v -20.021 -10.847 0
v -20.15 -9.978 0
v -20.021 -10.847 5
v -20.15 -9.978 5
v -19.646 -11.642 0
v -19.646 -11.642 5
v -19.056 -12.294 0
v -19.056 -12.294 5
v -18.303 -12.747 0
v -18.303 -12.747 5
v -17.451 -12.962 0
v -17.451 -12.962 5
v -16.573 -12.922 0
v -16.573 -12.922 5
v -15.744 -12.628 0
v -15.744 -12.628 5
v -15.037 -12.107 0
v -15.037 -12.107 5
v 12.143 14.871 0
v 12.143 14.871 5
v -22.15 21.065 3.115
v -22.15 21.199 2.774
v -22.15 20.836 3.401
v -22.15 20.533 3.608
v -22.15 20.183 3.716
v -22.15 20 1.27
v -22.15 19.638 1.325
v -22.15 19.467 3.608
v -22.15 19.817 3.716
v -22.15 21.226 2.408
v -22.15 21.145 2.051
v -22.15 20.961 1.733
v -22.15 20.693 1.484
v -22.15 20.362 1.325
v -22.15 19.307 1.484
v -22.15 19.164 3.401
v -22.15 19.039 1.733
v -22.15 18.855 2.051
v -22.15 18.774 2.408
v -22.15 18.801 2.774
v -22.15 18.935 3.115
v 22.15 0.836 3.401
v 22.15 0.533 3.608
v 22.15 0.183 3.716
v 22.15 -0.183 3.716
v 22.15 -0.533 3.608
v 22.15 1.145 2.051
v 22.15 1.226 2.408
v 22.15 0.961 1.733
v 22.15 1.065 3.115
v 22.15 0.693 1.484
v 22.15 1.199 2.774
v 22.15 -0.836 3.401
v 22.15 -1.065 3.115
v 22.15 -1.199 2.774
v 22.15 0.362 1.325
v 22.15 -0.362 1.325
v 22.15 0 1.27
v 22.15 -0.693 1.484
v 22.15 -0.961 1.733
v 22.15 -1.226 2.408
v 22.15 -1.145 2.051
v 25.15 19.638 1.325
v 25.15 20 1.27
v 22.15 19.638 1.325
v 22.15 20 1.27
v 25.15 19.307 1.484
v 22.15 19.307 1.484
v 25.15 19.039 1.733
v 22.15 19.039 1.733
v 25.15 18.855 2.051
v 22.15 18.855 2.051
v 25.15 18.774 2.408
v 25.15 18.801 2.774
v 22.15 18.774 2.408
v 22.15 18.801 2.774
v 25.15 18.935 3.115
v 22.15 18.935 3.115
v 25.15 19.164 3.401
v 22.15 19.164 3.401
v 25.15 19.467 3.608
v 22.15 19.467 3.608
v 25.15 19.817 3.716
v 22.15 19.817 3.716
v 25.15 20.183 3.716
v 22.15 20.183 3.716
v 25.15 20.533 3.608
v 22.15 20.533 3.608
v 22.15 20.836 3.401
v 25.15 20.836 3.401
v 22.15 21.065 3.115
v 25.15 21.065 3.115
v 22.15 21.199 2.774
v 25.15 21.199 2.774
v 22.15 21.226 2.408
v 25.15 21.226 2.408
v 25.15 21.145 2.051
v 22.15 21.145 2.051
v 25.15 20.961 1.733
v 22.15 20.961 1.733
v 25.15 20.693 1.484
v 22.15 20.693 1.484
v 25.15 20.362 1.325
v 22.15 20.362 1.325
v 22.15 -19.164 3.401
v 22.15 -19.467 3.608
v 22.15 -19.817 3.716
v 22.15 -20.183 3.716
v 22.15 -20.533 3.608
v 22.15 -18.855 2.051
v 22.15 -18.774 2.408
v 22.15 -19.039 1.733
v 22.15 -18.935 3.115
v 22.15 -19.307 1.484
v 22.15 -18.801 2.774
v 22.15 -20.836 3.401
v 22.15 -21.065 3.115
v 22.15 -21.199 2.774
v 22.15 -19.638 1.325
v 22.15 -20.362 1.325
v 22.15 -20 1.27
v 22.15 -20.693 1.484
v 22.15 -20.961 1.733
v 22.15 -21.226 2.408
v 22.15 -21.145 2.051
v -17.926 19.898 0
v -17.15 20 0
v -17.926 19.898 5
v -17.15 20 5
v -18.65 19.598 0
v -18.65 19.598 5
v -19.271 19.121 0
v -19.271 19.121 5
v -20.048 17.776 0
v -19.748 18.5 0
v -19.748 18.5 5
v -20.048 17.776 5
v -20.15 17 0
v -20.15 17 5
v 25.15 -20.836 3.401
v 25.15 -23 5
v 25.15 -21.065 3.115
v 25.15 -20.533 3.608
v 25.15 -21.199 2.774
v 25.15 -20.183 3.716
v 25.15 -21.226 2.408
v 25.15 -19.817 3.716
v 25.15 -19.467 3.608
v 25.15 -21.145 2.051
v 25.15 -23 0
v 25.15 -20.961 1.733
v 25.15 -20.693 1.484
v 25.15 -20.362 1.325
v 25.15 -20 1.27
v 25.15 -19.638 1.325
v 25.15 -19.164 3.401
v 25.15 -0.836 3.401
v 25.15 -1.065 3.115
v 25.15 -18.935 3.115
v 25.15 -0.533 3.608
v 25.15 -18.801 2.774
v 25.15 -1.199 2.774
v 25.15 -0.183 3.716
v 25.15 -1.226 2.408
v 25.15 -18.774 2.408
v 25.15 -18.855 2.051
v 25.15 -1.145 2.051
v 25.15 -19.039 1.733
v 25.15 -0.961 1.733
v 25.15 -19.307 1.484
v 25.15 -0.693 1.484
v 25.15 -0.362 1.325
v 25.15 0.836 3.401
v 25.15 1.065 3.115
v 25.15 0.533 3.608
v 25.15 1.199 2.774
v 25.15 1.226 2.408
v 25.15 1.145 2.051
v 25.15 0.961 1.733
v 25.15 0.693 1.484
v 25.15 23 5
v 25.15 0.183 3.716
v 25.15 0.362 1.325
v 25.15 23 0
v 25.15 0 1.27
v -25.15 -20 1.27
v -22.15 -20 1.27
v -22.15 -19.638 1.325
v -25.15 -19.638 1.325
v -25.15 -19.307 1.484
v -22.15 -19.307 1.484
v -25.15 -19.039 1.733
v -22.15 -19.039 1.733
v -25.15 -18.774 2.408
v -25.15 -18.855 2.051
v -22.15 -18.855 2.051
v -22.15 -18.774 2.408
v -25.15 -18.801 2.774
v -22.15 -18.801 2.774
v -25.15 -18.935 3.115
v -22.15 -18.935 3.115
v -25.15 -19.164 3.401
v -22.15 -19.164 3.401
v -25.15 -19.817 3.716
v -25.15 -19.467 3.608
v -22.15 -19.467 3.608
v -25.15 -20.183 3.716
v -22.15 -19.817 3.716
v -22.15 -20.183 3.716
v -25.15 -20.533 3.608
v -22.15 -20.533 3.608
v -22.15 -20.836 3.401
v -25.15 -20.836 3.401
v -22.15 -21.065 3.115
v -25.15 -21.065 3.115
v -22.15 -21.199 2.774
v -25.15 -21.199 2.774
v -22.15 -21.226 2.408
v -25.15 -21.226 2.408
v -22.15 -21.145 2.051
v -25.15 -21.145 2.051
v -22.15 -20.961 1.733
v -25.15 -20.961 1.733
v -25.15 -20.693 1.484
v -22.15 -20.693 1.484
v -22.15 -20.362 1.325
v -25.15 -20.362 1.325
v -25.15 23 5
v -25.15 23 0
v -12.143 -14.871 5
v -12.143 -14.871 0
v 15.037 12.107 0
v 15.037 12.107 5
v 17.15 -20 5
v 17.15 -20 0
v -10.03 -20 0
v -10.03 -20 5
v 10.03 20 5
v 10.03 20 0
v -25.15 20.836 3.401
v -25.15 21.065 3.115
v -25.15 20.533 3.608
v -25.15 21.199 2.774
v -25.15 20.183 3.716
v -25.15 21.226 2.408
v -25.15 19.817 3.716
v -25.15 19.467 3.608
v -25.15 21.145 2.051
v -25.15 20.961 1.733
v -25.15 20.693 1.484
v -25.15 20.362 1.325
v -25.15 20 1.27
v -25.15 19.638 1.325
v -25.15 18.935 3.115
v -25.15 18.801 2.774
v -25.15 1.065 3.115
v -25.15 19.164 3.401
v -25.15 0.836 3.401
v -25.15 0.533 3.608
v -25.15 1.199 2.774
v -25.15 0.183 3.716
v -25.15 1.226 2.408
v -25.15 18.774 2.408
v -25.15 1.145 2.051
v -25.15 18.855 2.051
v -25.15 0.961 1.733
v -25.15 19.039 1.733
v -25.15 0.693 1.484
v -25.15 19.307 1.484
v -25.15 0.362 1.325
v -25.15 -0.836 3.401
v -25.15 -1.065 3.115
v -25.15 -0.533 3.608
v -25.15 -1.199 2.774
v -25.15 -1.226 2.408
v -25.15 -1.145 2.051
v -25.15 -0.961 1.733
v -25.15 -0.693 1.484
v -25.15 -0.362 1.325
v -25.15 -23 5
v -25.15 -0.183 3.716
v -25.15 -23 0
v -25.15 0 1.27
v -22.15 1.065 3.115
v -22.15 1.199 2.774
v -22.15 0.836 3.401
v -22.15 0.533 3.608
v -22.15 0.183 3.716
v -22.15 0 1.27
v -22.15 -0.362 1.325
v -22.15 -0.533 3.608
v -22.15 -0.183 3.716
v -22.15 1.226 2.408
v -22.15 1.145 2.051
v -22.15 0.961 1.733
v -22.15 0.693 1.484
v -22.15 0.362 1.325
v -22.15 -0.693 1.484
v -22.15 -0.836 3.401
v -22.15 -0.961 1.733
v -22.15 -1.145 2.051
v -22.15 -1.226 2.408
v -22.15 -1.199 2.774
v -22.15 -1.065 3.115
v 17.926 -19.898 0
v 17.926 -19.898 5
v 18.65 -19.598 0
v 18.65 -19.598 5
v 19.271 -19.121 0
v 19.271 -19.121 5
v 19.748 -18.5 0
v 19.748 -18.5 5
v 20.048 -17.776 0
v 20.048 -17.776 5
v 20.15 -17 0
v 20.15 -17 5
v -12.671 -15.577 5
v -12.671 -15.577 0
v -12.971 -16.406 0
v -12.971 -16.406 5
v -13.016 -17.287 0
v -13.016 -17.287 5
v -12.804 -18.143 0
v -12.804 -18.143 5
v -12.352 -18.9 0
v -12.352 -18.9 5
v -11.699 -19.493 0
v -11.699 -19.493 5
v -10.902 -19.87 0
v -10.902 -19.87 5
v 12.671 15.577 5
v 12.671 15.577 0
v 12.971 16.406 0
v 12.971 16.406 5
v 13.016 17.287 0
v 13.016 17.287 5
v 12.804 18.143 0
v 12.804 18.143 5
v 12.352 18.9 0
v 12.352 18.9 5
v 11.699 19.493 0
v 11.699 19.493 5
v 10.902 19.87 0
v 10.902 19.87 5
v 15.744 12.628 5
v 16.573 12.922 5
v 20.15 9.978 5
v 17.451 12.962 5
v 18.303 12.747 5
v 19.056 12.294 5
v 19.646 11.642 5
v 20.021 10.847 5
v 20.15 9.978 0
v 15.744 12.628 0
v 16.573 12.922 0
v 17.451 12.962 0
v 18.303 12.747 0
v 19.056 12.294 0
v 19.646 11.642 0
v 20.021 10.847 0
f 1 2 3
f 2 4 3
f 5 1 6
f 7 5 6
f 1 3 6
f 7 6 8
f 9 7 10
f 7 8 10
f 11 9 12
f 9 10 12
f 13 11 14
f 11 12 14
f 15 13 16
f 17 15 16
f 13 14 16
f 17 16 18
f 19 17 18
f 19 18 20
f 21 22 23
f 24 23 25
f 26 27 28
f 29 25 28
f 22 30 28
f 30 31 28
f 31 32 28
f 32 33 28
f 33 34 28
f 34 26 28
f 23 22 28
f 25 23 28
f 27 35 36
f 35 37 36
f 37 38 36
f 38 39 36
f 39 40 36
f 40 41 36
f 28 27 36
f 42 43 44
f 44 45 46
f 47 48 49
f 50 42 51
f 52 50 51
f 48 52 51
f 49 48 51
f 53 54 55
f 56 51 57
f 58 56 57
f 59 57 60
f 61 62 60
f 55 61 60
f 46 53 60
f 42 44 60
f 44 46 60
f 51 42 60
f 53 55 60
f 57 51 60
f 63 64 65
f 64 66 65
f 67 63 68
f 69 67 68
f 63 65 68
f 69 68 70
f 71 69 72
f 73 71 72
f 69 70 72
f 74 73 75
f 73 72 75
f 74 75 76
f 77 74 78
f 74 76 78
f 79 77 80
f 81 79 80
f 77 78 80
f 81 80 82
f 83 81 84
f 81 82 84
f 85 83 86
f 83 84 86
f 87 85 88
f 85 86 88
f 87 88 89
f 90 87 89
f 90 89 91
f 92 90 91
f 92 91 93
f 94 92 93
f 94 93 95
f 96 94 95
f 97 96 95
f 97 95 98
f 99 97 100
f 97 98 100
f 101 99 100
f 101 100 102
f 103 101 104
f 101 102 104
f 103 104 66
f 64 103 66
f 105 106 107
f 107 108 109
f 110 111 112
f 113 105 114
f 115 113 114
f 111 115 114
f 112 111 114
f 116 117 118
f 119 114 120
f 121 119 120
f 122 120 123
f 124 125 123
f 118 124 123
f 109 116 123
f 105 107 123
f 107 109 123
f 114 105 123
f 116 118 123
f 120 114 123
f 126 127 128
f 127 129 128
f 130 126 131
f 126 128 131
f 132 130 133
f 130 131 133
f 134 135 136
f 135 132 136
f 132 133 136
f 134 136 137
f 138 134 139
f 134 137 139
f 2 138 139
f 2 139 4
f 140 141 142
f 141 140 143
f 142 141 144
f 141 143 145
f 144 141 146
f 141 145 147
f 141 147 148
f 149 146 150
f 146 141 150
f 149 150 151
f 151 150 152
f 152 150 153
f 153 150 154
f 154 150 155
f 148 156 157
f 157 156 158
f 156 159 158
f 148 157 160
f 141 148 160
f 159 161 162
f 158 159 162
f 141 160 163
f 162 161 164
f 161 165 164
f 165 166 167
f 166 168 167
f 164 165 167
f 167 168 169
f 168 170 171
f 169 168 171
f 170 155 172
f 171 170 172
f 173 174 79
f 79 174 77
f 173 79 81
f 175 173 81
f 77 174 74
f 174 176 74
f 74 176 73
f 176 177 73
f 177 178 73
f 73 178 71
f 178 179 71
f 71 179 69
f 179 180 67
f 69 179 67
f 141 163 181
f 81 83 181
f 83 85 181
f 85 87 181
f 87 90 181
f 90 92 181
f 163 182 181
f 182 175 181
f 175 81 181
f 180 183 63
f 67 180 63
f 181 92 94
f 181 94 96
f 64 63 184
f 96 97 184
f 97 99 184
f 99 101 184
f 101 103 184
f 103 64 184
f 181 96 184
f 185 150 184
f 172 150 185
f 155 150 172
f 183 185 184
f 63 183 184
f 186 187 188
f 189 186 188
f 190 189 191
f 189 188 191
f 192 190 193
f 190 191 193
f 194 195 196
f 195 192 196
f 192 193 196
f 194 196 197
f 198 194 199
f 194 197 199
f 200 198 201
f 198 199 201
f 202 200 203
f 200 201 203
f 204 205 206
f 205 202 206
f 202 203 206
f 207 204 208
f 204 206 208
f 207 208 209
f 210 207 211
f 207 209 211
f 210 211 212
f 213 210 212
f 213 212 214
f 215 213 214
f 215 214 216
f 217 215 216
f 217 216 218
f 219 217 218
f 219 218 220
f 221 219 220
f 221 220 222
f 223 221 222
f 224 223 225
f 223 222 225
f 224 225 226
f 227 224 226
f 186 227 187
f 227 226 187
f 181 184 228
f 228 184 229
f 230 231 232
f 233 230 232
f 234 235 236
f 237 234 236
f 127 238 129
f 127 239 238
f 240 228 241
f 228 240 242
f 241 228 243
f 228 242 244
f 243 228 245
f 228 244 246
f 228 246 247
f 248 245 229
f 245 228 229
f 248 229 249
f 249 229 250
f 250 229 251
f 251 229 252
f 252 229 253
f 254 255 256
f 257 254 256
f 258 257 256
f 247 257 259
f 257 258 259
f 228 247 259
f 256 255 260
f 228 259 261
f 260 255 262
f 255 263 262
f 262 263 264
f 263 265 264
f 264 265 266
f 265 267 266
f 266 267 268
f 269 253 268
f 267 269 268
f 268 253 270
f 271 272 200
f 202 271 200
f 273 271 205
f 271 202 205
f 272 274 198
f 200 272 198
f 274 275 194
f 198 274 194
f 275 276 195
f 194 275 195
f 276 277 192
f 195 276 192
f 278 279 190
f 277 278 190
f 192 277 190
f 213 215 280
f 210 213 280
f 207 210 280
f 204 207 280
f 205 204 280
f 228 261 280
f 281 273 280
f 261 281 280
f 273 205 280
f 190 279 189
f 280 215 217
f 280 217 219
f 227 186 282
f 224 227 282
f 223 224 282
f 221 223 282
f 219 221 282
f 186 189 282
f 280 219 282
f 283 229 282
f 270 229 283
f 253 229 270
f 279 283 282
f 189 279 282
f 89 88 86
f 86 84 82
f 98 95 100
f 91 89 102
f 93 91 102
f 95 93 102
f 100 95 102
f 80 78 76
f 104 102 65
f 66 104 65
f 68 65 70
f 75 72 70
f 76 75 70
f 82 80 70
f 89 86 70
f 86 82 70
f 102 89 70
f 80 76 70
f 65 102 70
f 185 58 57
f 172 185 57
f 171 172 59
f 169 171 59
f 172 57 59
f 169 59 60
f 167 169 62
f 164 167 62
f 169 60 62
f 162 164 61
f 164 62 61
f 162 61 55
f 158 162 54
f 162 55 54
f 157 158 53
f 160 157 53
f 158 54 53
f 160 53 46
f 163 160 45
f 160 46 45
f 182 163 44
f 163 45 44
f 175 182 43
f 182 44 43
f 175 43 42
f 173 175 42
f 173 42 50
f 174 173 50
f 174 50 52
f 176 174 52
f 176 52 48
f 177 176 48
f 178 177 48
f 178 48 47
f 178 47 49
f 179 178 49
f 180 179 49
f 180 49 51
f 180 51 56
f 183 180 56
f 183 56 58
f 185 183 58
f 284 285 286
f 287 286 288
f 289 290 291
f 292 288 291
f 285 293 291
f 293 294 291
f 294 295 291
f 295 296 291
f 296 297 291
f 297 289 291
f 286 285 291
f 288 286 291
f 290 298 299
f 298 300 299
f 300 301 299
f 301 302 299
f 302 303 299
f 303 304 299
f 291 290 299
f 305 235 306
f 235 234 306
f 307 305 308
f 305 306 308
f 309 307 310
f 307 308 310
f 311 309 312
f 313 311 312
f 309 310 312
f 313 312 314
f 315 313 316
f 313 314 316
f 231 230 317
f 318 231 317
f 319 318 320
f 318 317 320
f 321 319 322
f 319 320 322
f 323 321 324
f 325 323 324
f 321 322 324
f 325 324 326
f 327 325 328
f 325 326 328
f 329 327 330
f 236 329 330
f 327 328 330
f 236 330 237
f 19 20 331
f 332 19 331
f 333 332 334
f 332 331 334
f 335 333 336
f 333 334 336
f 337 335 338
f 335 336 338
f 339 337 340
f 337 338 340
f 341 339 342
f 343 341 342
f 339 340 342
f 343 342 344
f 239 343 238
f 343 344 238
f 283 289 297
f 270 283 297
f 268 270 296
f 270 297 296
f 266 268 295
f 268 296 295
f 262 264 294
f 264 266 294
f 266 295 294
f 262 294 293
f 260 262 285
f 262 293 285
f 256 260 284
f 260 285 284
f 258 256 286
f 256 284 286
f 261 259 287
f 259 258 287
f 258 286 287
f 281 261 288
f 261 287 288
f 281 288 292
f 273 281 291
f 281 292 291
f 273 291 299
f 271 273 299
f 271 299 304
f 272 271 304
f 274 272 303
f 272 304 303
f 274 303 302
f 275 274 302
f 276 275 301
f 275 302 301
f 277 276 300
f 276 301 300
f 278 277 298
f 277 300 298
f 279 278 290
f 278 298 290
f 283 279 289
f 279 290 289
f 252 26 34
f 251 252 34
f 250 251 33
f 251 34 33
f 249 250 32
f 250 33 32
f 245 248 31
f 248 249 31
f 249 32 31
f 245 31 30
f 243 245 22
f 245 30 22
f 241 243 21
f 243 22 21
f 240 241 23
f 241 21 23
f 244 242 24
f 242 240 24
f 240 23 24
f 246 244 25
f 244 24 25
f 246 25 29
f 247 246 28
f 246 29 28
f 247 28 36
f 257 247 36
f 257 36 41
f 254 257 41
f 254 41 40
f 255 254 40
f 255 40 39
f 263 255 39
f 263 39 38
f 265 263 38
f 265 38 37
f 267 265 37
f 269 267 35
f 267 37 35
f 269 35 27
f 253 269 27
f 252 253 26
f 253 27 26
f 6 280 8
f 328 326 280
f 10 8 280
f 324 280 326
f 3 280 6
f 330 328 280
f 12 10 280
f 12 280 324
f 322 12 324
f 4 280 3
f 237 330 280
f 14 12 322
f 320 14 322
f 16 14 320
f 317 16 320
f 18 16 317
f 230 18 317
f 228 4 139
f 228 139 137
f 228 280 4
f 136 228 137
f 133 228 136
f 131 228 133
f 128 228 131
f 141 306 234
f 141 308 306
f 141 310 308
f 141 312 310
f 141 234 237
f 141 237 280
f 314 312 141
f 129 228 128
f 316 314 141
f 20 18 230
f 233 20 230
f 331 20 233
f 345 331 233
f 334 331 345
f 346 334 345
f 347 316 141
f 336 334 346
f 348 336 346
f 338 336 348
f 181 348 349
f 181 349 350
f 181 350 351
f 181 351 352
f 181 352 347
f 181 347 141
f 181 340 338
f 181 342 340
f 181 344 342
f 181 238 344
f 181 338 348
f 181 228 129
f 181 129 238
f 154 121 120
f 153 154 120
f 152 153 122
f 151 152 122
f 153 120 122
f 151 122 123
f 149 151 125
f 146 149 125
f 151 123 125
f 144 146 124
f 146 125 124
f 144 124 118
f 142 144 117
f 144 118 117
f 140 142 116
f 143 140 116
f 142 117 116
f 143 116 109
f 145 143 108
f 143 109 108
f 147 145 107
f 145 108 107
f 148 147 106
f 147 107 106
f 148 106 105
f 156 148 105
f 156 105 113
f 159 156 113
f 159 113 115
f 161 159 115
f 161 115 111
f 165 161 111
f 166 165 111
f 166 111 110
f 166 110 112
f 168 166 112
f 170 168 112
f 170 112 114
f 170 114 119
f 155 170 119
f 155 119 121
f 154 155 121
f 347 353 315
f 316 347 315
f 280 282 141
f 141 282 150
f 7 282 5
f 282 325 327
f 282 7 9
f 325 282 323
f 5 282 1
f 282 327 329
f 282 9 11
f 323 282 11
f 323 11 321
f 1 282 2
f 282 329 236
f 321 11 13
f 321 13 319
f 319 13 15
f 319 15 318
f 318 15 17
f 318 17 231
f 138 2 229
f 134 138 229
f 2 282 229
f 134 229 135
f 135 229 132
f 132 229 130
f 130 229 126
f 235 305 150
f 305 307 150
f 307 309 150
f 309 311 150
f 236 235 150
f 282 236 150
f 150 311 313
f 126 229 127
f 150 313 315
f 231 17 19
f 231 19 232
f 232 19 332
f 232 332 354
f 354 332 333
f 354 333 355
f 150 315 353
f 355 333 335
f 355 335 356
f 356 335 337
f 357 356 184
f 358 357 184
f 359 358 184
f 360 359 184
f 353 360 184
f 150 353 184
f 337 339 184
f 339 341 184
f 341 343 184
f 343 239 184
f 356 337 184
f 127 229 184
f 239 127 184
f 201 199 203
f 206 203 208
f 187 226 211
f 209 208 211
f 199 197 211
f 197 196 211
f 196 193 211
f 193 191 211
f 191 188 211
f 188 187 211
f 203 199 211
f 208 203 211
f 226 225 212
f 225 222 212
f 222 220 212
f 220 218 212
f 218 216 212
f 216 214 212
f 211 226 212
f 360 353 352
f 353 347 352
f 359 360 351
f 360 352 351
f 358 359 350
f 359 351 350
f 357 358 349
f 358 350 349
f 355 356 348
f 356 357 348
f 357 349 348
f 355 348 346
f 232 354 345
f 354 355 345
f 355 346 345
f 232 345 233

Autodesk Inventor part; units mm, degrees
ref_plane "YZ Plane" through (0, 0, 0) normal (1, 0, 0) x (0, 1, 0)
ref_plane "XZ Plane" through (0, 0, 0) normal (0, 1, 0) x (-1, 0, 0)
ref_plane "XY Plane" through (0, 0, 0) normal (0, 0, 1) x (1, 0, 0)
sketch "スケッチ1" plane through (0, 0, 0) normal (0, 0, 1) x (1, 0, 0)
  line L0 (-25.15, -23) -> (25.15, -23)
  line L1 (25.15, -23) -> (25.15, 23)
  line L2 (25.15, 23) -> (-25.15, 23)
  line L3 (-25.15, 23) -> (-25.15, -23)
  line L4 (-25.15, -23) -> (25.15, 23) construction
  line L5 (25.15, -23) -> (-25.15, 23) construction
  line L6 (-25.15, 20) -> (25.15, 20) construction
  line L7 (-25.15, -20) -> (25.15, -20) construction
  line L8 (-25.15, 20) -> (-25.15, -20) construction
  line L9 (-20.15, 20) -> (-20.15, -17.1821)
  line L10 (-20.15, -17.1821) -> (17.3109, 20)
  line L11 (17.3109, 20) -> (-20.15, 20)
  line L12 (-20.15, -20) -> (20.15, -20) construction
  line L13 (20.15, -20) -> (20.15, 20) construction
  line L14 (20.15, 20) -> (-20.15, 20) construction
  line L15 (-20.15, 20) -> (-20.15, -20) construction
  line L16 (-20.15, -20) -> (20.15, 20) construction
  line L17 (20.15, -20) -> (-20.15, 20) construction
  line L18 (20.15, 17.1821) -> (20.15, -20)
  line L19 (20.15, -20) -> (-17.3109, -20)
  line L20 (-17.3109, -20) -> (20.15, 17.1821)
  point P0 (0, 0)
  point P1 (-25.15, 0)
  point P2 (0, 0)
  dimension "d1" = 50.3
  dimension "d3" = 40
  dimension "d5" = 3
  dimension "d9" = 5
  dimension "d16" = 3
  dimension "d17" = 2
extrude "押し出し1" add sketch "スケッチ1" along normal blind 5
fillet "フィレット1" radius 3 6 edges at (-20.15, -17.1821, 2.5) (-17.3109, -20, 2.5) (-20.15, 20, 2.5) (17.3109, 20, 2.5) (20.15, 17.1821, 2.5) (20.15, -20, 2.5)
sketch "スケッチ2" plane through (25.15, -23, 0) normal (1, 0, 0) x (0, 0, -1)
  line L0 (0, 46) -> (-5, 46) projected
  line L1 (-5, 0) -> (-5, 46) projected
  point P0 (0, 23)
  point P1 (-2.5, 3)
  point P2 (-2.5, 43)
  point P3 (-2.5, 23)
  point P4 (-2.5, 46)
  point P5 (-5, 23)
  dimension "d21" = 40
  dimension "d22" = 20
hole "穴1" at (25.15, -20, 2.5) at (25.15, 20, 2.5) at (25.15, 0, 2.5) direction (-1, 0, 0) diameter 2.459 depth 3 thread size "M3x0.5" class "6H" standard "ISO Metric profile"
mirror "ミラー1" about plane through (0, 0, 0) normal (1, 0, 0) of "穴1"
equation "\"d3\" = d13"
equation "\"d21\" = d3"
equation "\"d22\" = 0.5 * d21"
equation "\"d13\" = 40"
properties part number "リンク_ふともも_サブフレーム_1_1(予備案)" material "アルミニウム 2014-T4"
